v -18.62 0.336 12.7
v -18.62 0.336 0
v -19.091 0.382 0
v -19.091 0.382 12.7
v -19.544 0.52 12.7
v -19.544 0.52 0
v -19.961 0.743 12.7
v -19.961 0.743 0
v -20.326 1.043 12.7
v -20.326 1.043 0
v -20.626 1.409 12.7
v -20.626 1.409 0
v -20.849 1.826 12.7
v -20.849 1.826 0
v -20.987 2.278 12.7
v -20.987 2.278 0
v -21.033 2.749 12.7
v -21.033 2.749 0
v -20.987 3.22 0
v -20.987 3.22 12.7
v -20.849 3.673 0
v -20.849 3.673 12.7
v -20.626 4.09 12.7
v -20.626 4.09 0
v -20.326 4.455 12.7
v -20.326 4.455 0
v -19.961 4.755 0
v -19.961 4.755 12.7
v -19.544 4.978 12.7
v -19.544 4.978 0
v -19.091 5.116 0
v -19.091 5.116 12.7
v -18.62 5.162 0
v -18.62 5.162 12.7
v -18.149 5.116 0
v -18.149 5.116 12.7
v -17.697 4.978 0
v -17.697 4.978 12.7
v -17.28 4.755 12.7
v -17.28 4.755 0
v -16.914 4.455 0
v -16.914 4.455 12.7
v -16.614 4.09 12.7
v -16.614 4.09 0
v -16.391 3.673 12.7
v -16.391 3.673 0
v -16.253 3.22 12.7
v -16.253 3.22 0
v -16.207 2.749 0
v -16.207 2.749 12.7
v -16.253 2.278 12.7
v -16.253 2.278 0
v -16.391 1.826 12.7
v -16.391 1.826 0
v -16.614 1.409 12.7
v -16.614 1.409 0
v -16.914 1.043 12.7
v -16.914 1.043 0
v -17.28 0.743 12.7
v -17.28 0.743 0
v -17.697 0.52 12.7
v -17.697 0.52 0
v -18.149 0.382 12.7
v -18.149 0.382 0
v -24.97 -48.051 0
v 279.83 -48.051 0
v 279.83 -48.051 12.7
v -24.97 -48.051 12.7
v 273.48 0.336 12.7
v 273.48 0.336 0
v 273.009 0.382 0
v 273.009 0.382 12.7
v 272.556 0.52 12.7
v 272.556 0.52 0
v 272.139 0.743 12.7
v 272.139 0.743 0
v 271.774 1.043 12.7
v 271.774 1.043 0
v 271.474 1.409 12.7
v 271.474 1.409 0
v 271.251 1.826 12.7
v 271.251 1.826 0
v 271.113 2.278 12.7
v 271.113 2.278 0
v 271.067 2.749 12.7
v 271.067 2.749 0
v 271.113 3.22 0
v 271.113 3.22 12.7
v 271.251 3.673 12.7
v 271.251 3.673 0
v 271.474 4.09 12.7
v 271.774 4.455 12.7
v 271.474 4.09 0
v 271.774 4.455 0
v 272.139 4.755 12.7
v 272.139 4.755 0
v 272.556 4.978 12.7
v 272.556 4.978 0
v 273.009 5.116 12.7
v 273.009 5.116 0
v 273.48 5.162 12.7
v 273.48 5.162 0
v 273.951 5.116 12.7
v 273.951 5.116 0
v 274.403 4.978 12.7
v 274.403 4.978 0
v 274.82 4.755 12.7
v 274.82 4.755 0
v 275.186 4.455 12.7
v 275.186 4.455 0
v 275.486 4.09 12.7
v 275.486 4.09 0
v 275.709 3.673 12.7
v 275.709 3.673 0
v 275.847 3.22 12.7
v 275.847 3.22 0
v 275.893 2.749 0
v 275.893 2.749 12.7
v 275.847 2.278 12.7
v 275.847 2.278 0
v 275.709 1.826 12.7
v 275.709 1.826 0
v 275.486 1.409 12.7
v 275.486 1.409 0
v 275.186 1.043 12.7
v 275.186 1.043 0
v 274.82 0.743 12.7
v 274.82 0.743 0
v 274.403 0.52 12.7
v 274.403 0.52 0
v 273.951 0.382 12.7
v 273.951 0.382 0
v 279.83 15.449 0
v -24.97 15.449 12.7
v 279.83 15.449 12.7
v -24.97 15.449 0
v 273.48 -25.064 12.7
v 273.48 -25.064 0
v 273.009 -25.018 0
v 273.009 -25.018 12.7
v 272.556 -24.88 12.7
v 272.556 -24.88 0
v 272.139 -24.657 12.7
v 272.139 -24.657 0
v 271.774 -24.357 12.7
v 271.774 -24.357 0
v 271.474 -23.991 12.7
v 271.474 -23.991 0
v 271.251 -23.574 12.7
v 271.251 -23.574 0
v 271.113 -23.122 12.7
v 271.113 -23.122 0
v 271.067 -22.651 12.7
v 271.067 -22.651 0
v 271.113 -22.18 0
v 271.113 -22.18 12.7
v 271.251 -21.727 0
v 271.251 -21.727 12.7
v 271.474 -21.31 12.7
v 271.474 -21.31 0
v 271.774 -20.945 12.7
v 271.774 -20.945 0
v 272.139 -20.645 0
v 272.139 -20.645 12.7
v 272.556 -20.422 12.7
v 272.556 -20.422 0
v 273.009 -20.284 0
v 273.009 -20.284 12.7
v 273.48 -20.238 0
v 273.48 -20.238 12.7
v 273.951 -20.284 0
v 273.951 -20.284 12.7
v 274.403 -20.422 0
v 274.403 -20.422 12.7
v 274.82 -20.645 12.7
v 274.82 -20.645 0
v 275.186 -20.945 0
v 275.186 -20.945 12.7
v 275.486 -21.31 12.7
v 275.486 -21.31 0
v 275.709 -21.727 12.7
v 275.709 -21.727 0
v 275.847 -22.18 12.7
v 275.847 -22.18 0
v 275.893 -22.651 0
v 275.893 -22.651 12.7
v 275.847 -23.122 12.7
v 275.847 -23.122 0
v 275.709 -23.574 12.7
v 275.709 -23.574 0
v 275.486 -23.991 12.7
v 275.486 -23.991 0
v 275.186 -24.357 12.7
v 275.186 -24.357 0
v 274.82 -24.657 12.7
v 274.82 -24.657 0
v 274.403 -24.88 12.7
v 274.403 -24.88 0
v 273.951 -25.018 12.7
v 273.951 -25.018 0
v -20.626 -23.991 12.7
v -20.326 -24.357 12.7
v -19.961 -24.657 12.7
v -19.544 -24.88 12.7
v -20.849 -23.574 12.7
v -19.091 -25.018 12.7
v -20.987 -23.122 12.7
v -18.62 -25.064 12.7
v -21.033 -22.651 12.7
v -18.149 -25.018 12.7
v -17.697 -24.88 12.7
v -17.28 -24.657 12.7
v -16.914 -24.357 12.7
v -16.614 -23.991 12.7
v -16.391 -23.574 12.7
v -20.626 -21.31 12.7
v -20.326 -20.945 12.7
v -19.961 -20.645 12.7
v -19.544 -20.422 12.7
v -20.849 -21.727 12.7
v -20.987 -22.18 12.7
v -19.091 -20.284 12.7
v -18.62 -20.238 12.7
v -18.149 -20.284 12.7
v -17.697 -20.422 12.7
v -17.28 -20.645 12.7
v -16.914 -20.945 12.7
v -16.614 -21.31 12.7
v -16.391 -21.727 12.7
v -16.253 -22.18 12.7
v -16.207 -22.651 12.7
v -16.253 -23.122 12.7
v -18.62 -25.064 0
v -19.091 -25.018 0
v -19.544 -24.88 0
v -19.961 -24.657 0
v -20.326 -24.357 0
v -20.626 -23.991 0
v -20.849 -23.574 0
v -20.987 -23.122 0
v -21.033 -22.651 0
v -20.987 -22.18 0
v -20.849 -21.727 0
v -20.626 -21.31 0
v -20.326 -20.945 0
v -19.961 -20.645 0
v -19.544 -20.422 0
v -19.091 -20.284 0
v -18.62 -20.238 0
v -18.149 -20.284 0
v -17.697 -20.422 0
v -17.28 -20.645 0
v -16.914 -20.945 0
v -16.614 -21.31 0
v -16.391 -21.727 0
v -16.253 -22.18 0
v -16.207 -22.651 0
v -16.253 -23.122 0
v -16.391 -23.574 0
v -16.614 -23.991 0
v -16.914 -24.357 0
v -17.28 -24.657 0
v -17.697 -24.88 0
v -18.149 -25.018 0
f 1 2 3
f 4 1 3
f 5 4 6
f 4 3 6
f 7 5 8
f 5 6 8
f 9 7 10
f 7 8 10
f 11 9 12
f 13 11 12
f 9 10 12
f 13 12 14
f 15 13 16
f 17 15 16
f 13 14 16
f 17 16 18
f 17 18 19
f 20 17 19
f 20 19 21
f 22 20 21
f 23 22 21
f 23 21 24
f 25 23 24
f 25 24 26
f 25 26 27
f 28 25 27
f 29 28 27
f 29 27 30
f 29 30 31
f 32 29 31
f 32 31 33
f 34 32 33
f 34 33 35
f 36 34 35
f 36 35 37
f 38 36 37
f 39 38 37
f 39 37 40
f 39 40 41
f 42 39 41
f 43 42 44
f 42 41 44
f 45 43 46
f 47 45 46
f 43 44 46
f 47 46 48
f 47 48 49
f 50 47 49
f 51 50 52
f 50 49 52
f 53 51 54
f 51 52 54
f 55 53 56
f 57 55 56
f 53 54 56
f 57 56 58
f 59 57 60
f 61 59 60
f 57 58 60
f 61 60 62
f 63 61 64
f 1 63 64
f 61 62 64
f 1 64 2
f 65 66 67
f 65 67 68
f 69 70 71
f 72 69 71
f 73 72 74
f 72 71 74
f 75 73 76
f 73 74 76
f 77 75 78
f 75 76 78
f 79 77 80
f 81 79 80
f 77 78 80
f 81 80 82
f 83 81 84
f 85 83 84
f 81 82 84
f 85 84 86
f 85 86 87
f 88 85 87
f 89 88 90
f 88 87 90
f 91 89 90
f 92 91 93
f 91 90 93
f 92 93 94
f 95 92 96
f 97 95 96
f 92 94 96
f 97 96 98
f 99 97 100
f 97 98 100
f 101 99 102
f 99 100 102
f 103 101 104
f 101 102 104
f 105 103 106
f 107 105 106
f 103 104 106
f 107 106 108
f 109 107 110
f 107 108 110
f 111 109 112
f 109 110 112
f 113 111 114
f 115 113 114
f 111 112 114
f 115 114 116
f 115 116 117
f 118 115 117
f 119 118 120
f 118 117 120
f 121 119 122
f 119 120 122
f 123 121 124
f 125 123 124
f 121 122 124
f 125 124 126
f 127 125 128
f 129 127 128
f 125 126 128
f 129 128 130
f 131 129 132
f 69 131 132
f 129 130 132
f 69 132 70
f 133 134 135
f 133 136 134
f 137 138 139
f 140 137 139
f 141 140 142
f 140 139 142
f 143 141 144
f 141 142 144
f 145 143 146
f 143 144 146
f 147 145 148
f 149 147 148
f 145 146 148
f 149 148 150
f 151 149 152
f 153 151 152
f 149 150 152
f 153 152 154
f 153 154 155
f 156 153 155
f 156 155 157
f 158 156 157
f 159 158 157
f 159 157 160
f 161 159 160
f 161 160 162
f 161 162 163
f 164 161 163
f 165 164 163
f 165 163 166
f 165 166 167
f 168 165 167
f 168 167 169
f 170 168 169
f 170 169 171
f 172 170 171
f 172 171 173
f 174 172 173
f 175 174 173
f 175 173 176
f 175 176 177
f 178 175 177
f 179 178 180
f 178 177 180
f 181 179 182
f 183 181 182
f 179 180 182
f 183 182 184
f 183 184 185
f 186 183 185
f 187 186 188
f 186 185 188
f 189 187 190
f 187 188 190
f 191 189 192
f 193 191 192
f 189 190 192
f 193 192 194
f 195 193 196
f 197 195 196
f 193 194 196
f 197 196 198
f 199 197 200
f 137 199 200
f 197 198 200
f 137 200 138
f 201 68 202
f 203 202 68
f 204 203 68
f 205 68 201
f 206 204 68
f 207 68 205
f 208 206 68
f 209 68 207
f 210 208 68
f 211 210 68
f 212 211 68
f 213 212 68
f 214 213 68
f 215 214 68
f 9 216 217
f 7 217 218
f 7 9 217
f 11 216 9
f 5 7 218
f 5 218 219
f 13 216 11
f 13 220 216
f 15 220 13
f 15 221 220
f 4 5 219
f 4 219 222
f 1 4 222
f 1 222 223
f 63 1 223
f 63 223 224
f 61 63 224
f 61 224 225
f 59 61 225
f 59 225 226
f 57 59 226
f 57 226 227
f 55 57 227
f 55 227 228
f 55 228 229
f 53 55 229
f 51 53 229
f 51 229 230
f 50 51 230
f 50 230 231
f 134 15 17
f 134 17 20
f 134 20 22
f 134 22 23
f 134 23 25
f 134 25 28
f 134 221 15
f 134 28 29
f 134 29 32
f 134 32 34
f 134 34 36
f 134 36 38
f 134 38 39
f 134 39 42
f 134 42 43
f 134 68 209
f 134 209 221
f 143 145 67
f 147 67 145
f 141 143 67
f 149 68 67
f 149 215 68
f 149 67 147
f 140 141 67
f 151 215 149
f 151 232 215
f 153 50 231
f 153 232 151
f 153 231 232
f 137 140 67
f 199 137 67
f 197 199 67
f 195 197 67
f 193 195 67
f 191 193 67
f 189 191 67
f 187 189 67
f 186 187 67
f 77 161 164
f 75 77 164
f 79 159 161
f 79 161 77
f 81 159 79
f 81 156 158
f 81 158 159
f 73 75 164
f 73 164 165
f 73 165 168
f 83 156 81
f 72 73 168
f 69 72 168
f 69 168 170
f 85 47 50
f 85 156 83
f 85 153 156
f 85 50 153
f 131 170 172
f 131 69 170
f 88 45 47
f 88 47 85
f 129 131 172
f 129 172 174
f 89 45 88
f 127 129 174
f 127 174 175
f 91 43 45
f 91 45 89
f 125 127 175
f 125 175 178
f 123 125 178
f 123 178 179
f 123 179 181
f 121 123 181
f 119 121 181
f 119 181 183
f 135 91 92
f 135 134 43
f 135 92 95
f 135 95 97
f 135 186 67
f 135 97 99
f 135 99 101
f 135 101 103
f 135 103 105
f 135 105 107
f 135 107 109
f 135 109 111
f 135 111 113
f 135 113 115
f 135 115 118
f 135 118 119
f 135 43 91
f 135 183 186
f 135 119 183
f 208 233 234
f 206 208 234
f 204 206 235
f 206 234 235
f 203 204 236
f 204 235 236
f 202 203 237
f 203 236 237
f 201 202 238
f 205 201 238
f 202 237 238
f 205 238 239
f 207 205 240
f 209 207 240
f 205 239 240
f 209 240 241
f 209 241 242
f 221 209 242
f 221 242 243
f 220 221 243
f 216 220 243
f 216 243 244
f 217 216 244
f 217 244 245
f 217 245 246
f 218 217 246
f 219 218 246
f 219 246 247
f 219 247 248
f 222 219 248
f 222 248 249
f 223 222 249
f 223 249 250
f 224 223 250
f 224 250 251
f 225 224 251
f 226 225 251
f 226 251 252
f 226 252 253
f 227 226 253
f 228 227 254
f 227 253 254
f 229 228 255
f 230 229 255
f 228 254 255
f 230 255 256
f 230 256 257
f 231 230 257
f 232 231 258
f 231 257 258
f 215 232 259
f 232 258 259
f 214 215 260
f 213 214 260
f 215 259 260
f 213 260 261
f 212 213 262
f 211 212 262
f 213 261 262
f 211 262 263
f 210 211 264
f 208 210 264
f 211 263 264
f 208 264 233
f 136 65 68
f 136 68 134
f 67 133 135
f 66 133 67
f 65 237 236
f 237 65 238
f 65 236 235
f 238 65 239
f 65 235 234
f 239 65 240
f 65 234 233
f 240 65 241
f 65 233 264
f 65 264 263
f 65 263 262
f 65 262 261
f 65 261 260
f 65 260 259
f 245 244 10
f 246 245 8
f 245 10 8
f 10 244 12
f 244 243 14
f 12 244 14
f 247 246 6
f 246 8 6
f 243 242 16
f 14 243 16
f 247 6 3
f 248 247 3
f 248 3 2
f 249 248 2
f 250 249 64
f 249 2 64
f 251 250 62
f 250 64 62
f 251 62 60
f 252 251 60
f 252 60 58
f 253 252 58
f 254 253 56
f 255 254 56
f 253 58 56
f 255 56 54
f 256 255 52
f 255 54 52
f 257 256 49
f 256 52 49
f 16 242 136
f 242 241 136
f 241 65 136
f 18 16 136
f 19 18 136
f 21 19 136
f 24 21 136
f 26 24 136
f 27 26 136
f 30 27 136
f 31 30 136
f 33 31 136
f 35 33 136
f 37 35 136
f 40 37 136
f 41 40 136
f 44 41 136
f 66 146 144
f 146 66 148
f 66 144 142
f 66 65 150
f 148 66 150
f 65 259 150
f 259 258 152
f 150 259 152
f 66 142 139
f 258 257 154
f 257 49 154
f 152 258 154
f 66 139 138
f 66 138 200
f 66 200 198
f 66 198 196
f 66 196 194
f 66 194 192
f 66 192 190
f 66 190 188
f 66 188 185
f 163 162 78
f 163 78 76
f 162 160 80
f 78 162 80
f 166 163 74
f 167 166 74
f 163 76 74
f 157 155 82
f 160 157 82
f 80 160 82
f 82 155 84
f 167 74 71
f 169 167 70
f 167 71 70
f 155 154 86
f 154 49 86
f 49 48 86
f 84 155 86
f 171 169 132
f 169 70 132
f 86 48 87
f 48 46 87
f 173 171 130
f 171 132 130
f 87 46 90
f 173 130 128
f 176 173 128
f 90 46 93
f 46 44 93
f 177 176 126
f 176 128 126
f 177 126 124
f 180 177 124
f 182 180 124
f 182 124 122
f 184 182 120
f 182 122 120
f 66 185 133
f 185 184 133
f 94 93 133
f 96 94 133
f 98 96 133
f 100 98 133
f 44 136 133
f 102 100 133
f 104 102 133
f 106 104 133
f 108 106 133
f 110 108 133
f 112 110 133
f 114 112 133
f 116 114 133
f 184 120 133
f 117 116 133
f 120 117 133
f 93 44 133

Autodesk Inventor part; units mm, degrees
ref_plane "YZ Plane" through (0, 0, 0) normal (1, 0, 0) x (0, 1, 0)
ref_plane "XZ Plane" through (0, 0, 0) normal (0, 1, 0) x (-1, 0, 0)
ref_plane "XY Plane" through (0, 0, 0) normal (0, 0, 1) x (1, 0, 0)
sketch "Sketch1" plane through (0, 0, 0) normal (0, 0, 1) x (1, 0, 0)
  line L0 (-24.9701, 15.4491) -> (279.8299, 15.4491)
  line L1 (279.8299, 15.4491) -> (279.8299, -48.0509)
  line L2 (279.8299, -48.0509) -> (-24.9701, -48.0509)
  line L3 (-24.9701, -48.0509) -> (-24.9701, 15.4491)
  point P0 (0, 0)
  dimension "d0" = 304.8
  dimension "d1" = 63.5
extrude "Extrusion1" add sketch "Sketch1" along normal blind 12.7
hole "Hole1" at (-18.6201, 2.7491, 12.7) direction (0, 0, -1) diameter 4.826 end through all
hole "Hole2" at (-18.6201, -22.6509, 12.7) direction (0, 0, -1) diameter 4.826 end through all
hole "Hole3" at (273.4799, 2.7491, 12.7) direction (0, 0, -1) diameter 4.826 end through all
hole "Hole4" at (273.4799, -22.6509, 12.7) direction (0, 0, -1) diameter 4.826 end through all
sketch "Sketch2" plane through (0, 0, 12.7) normal (0, 0, 1) x (1, 0, 0)
  circle A0 centre (273.4799, -22.6509) radius 2.413 projected
  circle A1 centre (273.4799, 2.7491) radius 2.413 projected
  circle A2 centre (-18.6201, -22.6509) radius 2.413 projected
  circle A3 centre (-18.6201, 2.7491) radius 2.413 projected
  line L0 (279.8299, 15.4491) -> (279.8299, -48.0509) projected
  line L1 (-24.9701, 15.4491) -> (279.8299, 15.4491) projected
  line L2 (-24.9701, -48.0509) -> (-24.9701, 15.4491) projected
  line L3 (279.8299, -48.0509) -> (-24.9701, -48.0509) projected
  point P0 (0, 0)
  dimension "d40" = 304.8
  dimension "d41" = 63.5
  dimension "d42" = 6.35
  dimension "d43" = 6.35
  dimension "d44" = 6.35
  dimension "d45" = 6.35
sketch "Sketch3" plane through (0, 0, 12.7) normal (0, 0, 1) x (1, 0, 0)
  circle A0 centre (273.4799, -22.6509) radius 2.413 projected
  circle A1 centre (273.4799, 2.7491) radius 2.413 projected
  circle A2 centre (-18.6201, -22.6509) radius 2.413 projected
  circle A3 centre (-18.6201, 2.7491) radius 2.413 projected
  line L0 (279.8299, 15.4491) -> (279.8299, -48.0509) projected
  line L1 (-24.9701, 15.4491) -> (279.8299, 15.4491) projected
  line L2 (-24.9701, -48.0509) -> (-24.9701, 15.4491) projected
  line L3 (279.8299, -48.0509) -> (-24.9701, -48.0509) projected
  point P0 (0, 0)
properties part number "xcross1"
